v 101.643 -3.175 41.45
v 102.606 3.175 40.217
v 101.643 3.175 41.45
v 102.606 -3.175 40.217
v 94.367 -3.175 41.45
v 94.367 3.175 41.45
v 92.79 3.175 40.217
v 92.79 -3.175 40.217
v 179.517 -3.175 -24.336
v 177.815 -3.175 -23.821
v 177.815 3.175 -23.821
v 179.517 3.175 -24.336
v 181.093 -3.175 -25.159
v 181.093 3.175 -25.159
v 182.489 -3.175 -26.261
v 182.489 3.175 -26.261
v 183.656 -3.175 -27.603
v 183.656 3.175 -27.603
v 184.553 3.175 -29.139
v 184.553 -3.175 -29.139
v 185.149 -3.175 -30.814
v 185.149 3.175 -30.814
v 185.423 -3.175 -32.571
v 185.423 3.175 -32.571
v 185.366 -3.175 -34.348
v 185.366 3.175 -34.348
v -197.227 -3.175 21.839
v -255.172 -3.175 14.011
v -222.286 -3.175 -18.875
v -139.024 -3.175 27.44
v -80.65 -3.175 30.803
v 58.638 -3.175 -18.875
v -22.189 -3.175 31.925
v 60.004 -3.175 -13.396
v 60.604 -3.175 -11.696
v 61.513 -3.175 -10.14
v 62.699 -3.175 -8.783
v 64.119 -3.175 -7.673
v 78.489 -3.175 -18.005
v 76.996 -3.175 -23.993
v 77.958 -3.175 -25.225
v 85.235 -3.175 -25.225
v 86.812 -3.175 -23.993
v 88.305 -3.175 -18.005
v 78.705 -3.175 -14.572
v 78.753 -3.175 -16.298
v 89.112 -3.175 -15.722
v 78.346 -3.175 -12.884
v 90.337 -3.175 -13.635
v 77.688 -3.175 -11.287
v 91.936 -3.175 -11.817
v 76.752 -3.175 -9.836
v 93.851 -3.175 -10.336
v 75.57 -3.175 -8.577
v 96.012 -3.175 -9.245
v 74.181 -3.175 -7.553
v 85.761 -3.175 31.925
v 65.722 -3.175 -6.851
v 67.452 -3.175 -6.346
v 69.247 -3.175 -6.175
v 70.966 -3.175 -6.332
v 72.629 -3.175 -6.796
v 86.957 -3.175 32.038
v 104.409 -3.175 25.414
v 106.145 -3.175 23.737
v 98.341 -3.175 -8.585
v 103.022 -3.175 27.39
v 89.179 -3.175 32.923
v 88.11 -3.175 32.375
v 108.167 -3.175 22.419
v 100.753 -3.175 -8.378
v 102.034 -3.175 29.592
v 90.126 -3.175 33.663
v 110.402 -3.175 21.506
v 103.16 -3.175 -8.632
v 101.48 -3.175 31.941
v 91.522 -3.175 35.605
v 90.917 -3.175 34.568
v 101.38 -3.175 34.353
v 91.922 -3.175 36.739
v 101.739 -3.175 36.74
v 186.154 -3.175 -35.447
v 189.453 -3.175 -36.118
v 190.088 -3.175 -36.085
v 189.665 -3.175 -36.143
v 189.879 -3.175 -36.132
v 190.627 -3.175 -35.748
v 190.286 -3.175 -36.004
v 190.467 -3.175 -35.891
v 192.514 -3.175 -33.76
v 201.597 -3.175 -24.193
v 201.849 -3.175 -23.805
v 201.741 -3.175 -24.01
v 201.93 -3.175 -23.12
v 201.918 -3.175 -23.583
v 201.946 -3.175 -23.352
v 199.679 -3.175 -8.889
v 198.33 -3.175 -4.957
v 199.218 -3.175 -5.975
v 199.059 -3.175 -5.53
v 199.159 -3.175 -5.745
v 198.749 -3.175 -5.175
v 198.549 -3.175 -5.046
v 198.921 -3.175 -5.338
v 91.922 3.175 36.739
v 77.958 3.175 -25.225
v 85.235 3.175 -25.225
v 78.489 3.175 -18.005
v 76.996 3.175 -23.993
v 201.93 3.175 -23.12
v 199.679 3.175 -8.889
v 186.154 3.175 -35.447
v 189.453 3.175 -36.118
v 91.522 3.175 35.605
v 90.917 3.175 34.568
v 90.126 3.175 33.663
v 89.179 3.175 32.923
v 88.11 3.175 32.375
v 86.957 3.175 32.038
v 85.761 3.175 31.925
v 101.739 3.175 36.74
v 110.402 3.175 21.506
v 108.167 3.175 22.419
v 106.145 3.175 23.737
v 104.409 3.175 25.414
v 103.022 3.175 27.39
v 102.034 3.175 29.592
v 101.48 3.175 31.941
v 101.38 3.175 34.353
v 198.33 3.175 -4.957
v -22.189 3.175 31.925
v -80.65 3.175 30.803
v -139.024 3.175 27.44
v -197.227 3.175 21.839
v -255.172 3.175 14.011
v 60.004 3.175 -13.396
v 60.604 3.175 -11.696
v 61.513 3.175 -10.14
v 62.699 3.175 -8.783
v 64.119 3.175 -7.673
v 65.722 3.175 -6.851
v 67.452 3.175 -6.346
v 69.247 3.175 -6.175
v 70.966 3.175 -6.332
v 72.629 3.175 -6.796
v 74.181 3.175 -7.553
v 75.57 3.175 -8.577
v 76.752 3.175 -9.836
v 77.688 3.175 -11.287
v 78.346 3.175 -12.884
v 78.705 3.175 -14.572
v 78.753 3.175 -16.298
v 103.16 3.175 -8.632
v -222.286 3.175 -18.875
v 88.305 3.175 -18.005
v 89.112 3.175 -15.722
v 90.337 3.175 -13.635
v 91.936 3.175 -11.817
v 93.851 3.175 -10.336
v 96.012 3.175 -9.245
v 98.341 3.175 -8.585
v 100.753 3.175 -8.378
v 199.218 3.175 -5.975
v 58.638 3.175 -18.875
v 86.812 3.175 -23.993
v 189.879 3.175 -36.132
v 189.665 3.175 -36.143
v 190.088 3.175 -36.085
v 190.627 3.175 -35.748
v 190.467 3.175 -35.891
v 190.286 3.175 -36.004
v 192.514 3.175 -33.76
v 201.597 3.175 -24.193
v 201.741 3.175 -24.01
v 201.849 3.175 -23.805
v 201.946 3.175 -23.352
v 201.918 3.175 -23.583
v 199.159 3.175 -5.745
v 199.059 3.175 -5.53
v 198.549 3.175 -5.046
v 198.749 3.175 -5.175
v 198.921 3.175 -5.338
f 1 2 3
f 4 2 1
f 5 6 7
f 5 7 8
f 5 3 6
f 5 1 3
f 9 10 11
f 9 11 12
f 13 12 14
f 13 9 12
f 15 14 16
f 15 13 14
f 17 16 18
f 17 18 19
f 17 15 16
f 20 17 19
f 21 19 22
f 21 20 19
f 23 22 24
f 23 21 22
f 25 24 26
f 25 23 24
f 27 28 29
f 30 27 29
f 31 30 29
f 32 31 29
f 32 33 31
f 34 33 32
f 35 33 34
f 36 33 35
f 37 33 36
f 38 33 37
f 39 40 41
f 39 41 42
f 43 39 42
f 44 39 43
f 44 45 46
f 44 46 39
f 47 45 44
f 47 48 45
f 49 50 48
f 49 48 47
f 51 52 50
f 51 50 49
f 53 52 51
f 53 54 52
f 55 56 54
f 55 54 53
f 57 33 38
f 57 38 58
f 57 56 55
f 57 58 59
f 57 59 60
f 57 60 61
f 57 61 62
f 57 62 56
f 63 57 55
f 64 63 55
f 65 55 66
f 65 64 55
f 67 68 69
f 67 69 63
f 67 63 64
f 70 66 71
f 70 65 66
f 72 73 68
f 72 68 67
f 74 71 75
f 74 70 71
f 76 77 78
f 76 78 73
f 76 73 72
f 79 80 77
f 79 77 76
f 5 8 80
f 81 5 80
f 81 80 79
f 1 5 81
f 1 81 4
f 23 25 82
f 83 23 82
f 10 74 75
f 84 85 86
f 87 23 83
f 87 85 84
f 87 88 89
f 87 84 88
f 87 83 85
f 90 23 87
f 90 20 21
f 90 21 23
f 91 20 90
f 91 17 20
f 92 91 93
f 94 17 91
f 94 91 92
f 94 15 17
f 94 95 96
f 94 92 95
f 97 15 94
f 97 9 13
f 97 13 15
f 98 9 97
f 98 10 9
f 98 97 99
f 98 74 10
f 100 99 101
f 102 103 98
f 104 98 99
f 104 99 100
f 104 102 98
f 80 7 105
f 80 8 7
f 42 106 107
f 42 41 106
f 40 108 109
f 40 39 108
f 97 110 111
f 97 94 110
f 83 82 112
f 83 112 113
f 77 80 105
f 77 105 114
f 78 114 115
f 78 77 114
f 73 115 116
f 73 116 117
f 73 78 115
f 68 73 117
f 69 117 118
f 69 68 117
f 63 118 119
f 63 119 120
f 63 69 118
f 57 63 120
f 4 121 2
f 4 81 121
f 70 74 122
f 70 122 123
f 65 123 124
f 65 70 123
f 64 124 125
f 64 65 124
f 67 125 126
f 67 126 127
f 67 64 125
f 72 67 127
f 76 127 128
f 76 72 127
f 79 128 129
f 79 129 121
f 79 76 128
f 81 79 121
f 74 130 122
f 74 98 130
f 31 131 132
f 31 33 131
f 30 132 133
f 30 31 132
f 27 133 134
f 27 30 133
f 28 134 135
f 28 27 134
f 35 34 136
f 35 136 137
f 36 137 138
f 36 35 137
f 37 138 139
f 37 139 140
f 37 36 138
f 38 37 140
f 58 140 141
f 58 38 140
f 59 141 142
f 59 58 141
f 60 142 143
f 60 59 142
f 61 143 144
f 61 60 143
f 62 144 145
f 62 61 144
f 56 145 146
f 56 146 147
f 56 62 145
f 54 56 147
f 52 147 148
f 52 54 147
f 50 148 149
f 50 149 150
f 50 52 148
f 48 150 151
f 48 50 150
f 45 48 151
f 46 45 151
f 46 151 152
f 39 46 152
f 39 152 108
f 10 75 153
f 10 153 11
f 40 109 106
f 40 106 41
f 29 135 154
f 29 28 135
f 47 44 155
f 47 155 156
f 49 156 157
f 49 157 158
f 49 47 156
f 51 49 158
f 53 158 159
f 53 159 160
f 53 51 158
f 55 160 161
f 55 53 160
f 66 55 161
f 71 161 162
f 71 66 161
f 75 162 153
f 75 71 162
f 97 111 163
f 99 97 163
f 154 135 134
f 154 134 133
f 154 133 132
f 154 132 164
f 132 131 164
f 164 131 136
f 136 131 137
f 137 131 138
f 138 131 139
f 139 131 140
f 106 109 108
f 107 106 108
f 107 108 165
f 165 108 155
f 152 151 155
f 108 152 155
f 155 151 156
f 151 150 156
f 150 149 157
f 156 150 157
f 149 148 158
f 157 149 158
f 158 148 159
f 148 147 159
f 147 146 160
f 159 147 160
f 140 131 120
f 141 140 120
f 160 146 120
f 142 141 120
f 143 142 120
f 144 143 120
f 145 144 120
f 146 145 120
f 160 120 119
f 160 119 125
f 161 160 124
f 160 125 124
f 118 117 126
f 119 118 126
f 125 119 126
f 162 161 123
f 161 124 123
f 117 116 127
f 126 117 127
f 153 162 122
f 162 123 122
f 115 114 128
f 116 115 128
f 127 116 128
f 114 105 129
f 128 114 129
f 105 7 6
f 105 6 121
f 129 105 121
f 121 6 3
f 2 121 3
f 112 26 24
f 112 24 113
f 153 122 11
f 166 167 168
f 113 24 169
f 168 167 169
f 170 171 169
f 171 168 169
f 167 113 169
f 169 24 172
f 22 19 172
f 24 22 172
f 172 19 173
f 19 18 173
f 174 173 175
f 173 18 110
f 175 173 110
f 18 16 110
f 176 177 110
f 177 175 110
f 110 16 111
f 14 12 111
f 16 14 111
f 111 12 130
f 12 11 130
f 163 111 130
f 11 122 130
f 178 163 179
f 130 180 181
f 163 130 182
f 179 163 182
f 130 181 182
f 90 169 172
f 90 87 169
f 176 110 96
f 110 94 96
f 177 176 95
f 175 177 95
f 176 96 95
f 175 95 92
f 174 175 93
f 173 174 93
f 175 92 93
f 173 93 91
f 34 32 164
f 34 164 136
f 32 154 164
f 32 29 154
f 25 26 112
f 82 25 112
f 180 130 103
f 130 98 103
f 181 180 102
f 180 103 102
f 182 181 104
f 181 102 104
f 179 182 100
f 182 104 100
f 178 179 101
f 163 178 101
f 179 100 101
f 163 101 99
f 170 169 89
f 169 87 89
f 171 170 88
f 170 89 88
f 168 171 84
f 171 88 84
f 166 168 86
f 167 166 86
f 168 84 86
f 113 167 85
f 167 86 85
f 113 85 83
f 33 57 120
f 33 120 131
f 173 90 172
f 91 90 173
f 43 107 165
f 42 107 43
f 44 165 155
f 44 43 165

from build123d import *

# Parameters (mm, degrees)
F1_DEPTH    = 3.175
F2_SIZE2    = 1.27
F2_SIZE     = 1.27
F3_SIZE     = 1.27
F4_T1_DEPTH = 11.3354455178
F5_R        = 1.27


# Not quite as in the source:
# - a fillet or chamfer that OpenCascade refuses, or shapes differently, is made with other operations: its cross-section is extruded or revolved along the edge and cut away or added


with BuildPart() as f1:
    # F0 (on Front) → F1 (new body, symmetric)
    with BuildSketch(Plane.XZ):
        with BuildLine():
            Line((-222.2856830398, -18.875252817), (58.6383169602, -18.875252817))
            Line((58.6383169602, -18.875252817), (60.004461396, -13.3959467614))
            ThreePointArc((60.004461396, -13.3959467614), (63.3823526363, -8.1944503889), (69.2465281888, -6.175252817))
            Line((69.2465281888, -6.175252817), (-217.0251707977, -6.175252817))
            Line((-217.0251707977, -6.175252817), (-222.2856830398, -18.875252817))
        make_face()
        Polygon((-255.1717254639, 14.010789607), (-222.2856830398, -18.875252817), (-217.0251707977, -6.175252817), (-238.4935903897, 15.293166775), align=None)
        with BuildLine():
            ThreePointArc((-22.1892522704, 31.924747183), (-139.0243312187, 27.4396580434), (-255.1717254639, 14.0107896071))
            Line((-255.1717254639, 14.0107896071), (-238.4935903897, 15.293166775))
            Line((-238.4935903897, 15.293166775), (-22.1892522704, 31.924747183))
        make_face()
        with BuildLine():
            Line((-238.4935903897, 15.293166775), (-217.0251707977, -6.175252817))
            Line((-217.0251707977, -6.175252817), (69.2465281888, -6.175252817))
            ThreePointArc((69.2465281888, -6.175252817), (76.7523306169, -9.8360772646), (78.4885949816, -18.0045588726))
            Line((78.4885949816, -18.0045588726), (76.6882737813, -25.225252817))
            Line((76.6882737813, -25.225252817), (86.5048686008, -25.225252817))
            Line((86.5048686008, -25.225252817), (88.3051898011, -18.0045588726))
            ThreePointArc((88.3051898011, -18.0045588726), (93.8510411727, -10.3362236111), (103.1599182919, -8.631923198))
            Line((103.1599182919, -8.631923198), (177.815158105, -23.8207034021))
            ThreePointArc((177.815158105, -23.8207034021), (183.9152537909, -27.983372217), (185.2067697838, -35.2546145785))
            Line((185.2067697838, -35.2546145785), (190.1425618478, -36.2588128234))
            Line((190.1425618478, -36.2588128234), (192.5143319625, -33.7604418083))
            Line((192.5143319625, -33.7604418083), (199.6791825839, -8.8887735704))
            Line((199.6791825839, -8.8887735704), (199.0935677301, -5.1867834867))
            Line((199.0935677301, -5.1867834867), (110.401744257, 21.506425589))
            ThreePointArc((110.401744257, 21.506425589), (103.0219894482, 27.389702526), (101.7390811386, 36.7399899454))
            Line((101.7390811386, 36.7399899454), (102.9133555046, 41.449747183))
            Line((102.9133555046, 41.449747183), (93.096760685, 41.449747183))
            Line((93.096760685, 41.449747183), (91.9221255914, 36.7385431459))
            ThreePointArc((91.9221255914, 36.7385431459), (89.6701980979, 33.2708788976), (85.7607477296, 31.924747183))
            Line((85.7607477296, 31.924747183), (-22.1892522704, 31.924747183))
            Line((-22.1892522704, 31.924747183), (-238.4935903897, 15.293166775))
        make_face()
        Polygon((202.0282745361, -23.738661781), (199.6791825839, -8.8887735704), (192.5143319625, -33.7604418083), align=None)
    extrude(amount=F1_DEPTH, both=True)

    # F2
    f2_edges = [f1.edges().sort_by_distance(p)[0] for p in [
        (93.096761, 0, 41.449747),
        (86.504869, 0, -25.225253),
    ]]
    chamfer(f2_edges, length=F2_SIZE, length2=F2_SIZE2)

    # F3
    f3_edges = [f1.edges().sort_by_distance(p)[0] for p in [
        (102.913356, 0, 41.449747),
        (76.688274, 0, -25.225253),
    ]]
    chamfer(f3_edges, length=F3_SIZE)

    # F4: chamfer of 1.016 on 1 edges, made by hand

    # F4_s2 → F4_t1 (cut)
    with BuildSketch(Plane.XZ.offset(-5.6677227589)):
        with BuildLine():
            Line((185.3423672188, -34.3154020779), (186.1779563064, -35.4804096602))
            Line((186.1779563064, -35.4804096602), (186.1739051499, -35.5003217302))
            ThreePointArc((186.1739051499, -35.5003217302), (185.6910670267, -35.3738822533), (185.2027186274, -35.2745266485))
            Line((185.2027186274, -35.2745266485), (185.1869498558, -35.2501343047))
            ThreePointArc((185.1869498558, -35.2501343047), (185.2797978886, -34.7859194498), (185.322207486, -34.3128550063))
            Line((185.322207486, -34.3128550063), (185.3423672188, -34.3154020779))
        make_face()
    extrude(amount=F4_T1_DEPTH, mode=Mode.SUBTRACT)

    # F5
    f5_edges = [f1.edges().sort_by_distance(p)[0] for p in [
        (202.028275, 0, -23.738662),
        (199.093568, 0, -5.186783),
        (190.142562, 0, -36.258813),
    ]]
    fillet(f5_edges, radius=F5_R)


solid = f1.part
